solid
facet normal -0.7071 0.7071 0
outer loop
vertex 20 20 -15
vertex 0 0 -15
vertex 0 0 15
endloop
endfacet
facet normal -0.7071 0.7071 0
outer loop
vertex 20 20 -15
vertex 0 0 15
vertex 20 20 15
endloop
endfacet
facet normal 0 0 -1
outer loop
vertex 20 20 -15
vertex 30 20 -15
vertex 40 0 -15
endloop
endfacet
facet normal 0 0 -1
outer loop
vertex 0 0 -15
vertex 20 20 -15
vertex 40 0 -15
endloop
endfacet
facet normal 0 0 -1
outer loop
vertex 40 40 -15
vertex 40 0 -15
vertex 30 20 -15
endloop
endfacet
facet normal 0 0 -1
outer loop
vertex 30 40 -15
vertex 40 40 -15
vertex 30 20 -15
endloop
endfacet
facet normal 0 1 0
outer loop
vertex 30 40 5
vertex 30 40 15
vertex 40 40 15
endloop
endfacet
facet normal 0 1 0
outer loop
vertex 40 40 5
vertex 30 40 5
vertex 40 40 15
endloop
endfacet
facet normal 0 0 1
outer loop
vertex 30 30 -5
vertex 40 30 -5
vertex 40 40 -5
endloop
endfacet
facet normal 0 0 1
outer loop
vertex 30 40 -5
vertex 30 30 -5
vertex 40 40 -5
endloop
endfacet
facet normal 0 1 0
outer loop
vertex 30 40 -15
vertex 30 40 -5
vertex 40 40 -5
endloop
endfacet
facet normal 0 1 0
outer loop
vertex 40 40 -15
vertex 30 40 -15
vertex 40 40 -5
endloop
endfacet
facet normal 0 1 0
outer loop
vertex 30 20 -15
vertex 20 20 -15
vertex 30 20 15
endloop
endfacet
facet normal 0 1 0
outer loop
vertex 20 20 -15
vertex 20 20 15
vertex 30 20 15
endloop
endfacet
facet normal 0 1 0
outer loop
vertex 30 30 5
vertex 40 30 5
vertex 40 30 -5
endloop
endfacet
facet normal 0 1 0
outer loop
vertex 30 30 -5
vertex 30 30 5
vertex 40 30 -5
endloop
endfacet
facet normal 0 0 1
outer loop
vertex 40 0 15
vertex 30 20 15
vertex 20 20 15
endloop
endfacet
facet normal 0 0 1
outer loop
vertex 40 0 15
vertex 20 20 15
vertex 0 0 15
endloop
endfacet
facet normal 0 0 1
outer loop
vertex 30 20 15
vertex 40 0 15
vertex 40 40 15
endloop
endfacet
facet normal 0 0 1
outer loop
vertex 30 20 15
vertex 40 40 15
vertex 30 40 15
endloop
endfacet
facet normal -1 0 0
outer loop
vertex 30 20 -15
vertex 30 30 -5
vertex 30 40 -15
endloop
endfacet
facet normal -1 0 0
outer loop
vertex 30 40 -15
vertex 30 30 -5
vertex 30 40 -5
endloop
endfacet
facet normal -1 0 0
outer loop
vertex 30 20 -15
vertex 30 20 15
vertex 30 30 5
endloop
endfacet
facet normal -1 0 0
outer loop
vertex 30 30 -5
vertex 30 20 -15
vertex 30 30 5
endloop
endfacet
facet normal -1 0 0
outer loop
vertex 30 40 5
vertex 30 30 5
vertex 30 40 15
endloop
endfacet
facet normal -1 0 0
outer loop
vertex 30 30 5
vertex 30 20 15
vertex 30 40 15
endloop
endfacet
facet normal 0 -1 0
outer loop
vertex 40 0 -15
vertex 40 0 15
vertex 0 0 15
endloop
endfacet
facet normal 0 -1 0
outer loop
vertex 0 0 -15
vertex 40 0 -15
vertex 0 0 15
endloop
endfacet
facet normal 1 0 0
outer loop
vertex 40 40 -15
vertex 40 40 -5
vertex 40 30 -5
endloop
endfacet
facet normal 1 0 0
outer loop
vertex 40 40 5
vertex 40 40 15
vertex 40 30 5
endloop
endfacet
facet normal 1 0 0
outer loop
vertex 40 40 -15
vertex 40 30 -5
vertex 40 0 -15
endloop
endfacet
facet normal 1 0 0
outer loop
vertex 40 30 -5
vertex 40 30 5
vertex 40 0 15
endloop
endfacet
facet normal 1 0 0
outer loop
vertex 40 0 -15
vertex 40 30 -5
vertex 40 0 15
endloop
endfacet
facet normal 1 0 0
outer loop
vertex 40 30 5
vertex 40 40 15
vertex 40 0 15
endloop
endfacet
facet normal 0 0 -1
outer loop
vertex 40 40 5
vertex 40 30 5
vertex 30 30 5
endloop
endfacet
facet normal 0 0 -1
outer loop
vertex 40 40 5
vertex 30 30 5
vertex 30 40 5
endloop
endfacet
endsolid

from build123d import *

# Parameters (mm, degrees)
RESSALTO_EXTRUS_O1_DEPTH = 15
ESBO_O2_W                = 10
ESBO_O2_H                = 10
CORTE_EXTRUS_O1_DEPTH    = 41


with BuildPart() as part:
    # Esboço1 → Ressalto-extrusão1 (new body, symmetric)
    with BuildSketch(Plane.XY):
        Polygon((0, 0), (20, 20), (30, 20), (30, 40), (40, 40), (40, 0), align=None)
    extrude(amount=RESSALTO_EXTRUS_O1_DEPTH, both=True)

    # Esboço2 → Corte-extrusão1 (cut, through all)
    with BuildSketch(Plane(origin=(40, 0, 0), x_dir=(0, 0, -1), z_dir=(1, 0, 0))):
        with Locations((0, 35)):
            Rectangle(ESBO_O2_W, ESBO_O2_H)
    extrude(amount=-CORTE_EXTRUS_O1_DEPTH, mode=Mode.SUBTRACT)


solid = part.part
